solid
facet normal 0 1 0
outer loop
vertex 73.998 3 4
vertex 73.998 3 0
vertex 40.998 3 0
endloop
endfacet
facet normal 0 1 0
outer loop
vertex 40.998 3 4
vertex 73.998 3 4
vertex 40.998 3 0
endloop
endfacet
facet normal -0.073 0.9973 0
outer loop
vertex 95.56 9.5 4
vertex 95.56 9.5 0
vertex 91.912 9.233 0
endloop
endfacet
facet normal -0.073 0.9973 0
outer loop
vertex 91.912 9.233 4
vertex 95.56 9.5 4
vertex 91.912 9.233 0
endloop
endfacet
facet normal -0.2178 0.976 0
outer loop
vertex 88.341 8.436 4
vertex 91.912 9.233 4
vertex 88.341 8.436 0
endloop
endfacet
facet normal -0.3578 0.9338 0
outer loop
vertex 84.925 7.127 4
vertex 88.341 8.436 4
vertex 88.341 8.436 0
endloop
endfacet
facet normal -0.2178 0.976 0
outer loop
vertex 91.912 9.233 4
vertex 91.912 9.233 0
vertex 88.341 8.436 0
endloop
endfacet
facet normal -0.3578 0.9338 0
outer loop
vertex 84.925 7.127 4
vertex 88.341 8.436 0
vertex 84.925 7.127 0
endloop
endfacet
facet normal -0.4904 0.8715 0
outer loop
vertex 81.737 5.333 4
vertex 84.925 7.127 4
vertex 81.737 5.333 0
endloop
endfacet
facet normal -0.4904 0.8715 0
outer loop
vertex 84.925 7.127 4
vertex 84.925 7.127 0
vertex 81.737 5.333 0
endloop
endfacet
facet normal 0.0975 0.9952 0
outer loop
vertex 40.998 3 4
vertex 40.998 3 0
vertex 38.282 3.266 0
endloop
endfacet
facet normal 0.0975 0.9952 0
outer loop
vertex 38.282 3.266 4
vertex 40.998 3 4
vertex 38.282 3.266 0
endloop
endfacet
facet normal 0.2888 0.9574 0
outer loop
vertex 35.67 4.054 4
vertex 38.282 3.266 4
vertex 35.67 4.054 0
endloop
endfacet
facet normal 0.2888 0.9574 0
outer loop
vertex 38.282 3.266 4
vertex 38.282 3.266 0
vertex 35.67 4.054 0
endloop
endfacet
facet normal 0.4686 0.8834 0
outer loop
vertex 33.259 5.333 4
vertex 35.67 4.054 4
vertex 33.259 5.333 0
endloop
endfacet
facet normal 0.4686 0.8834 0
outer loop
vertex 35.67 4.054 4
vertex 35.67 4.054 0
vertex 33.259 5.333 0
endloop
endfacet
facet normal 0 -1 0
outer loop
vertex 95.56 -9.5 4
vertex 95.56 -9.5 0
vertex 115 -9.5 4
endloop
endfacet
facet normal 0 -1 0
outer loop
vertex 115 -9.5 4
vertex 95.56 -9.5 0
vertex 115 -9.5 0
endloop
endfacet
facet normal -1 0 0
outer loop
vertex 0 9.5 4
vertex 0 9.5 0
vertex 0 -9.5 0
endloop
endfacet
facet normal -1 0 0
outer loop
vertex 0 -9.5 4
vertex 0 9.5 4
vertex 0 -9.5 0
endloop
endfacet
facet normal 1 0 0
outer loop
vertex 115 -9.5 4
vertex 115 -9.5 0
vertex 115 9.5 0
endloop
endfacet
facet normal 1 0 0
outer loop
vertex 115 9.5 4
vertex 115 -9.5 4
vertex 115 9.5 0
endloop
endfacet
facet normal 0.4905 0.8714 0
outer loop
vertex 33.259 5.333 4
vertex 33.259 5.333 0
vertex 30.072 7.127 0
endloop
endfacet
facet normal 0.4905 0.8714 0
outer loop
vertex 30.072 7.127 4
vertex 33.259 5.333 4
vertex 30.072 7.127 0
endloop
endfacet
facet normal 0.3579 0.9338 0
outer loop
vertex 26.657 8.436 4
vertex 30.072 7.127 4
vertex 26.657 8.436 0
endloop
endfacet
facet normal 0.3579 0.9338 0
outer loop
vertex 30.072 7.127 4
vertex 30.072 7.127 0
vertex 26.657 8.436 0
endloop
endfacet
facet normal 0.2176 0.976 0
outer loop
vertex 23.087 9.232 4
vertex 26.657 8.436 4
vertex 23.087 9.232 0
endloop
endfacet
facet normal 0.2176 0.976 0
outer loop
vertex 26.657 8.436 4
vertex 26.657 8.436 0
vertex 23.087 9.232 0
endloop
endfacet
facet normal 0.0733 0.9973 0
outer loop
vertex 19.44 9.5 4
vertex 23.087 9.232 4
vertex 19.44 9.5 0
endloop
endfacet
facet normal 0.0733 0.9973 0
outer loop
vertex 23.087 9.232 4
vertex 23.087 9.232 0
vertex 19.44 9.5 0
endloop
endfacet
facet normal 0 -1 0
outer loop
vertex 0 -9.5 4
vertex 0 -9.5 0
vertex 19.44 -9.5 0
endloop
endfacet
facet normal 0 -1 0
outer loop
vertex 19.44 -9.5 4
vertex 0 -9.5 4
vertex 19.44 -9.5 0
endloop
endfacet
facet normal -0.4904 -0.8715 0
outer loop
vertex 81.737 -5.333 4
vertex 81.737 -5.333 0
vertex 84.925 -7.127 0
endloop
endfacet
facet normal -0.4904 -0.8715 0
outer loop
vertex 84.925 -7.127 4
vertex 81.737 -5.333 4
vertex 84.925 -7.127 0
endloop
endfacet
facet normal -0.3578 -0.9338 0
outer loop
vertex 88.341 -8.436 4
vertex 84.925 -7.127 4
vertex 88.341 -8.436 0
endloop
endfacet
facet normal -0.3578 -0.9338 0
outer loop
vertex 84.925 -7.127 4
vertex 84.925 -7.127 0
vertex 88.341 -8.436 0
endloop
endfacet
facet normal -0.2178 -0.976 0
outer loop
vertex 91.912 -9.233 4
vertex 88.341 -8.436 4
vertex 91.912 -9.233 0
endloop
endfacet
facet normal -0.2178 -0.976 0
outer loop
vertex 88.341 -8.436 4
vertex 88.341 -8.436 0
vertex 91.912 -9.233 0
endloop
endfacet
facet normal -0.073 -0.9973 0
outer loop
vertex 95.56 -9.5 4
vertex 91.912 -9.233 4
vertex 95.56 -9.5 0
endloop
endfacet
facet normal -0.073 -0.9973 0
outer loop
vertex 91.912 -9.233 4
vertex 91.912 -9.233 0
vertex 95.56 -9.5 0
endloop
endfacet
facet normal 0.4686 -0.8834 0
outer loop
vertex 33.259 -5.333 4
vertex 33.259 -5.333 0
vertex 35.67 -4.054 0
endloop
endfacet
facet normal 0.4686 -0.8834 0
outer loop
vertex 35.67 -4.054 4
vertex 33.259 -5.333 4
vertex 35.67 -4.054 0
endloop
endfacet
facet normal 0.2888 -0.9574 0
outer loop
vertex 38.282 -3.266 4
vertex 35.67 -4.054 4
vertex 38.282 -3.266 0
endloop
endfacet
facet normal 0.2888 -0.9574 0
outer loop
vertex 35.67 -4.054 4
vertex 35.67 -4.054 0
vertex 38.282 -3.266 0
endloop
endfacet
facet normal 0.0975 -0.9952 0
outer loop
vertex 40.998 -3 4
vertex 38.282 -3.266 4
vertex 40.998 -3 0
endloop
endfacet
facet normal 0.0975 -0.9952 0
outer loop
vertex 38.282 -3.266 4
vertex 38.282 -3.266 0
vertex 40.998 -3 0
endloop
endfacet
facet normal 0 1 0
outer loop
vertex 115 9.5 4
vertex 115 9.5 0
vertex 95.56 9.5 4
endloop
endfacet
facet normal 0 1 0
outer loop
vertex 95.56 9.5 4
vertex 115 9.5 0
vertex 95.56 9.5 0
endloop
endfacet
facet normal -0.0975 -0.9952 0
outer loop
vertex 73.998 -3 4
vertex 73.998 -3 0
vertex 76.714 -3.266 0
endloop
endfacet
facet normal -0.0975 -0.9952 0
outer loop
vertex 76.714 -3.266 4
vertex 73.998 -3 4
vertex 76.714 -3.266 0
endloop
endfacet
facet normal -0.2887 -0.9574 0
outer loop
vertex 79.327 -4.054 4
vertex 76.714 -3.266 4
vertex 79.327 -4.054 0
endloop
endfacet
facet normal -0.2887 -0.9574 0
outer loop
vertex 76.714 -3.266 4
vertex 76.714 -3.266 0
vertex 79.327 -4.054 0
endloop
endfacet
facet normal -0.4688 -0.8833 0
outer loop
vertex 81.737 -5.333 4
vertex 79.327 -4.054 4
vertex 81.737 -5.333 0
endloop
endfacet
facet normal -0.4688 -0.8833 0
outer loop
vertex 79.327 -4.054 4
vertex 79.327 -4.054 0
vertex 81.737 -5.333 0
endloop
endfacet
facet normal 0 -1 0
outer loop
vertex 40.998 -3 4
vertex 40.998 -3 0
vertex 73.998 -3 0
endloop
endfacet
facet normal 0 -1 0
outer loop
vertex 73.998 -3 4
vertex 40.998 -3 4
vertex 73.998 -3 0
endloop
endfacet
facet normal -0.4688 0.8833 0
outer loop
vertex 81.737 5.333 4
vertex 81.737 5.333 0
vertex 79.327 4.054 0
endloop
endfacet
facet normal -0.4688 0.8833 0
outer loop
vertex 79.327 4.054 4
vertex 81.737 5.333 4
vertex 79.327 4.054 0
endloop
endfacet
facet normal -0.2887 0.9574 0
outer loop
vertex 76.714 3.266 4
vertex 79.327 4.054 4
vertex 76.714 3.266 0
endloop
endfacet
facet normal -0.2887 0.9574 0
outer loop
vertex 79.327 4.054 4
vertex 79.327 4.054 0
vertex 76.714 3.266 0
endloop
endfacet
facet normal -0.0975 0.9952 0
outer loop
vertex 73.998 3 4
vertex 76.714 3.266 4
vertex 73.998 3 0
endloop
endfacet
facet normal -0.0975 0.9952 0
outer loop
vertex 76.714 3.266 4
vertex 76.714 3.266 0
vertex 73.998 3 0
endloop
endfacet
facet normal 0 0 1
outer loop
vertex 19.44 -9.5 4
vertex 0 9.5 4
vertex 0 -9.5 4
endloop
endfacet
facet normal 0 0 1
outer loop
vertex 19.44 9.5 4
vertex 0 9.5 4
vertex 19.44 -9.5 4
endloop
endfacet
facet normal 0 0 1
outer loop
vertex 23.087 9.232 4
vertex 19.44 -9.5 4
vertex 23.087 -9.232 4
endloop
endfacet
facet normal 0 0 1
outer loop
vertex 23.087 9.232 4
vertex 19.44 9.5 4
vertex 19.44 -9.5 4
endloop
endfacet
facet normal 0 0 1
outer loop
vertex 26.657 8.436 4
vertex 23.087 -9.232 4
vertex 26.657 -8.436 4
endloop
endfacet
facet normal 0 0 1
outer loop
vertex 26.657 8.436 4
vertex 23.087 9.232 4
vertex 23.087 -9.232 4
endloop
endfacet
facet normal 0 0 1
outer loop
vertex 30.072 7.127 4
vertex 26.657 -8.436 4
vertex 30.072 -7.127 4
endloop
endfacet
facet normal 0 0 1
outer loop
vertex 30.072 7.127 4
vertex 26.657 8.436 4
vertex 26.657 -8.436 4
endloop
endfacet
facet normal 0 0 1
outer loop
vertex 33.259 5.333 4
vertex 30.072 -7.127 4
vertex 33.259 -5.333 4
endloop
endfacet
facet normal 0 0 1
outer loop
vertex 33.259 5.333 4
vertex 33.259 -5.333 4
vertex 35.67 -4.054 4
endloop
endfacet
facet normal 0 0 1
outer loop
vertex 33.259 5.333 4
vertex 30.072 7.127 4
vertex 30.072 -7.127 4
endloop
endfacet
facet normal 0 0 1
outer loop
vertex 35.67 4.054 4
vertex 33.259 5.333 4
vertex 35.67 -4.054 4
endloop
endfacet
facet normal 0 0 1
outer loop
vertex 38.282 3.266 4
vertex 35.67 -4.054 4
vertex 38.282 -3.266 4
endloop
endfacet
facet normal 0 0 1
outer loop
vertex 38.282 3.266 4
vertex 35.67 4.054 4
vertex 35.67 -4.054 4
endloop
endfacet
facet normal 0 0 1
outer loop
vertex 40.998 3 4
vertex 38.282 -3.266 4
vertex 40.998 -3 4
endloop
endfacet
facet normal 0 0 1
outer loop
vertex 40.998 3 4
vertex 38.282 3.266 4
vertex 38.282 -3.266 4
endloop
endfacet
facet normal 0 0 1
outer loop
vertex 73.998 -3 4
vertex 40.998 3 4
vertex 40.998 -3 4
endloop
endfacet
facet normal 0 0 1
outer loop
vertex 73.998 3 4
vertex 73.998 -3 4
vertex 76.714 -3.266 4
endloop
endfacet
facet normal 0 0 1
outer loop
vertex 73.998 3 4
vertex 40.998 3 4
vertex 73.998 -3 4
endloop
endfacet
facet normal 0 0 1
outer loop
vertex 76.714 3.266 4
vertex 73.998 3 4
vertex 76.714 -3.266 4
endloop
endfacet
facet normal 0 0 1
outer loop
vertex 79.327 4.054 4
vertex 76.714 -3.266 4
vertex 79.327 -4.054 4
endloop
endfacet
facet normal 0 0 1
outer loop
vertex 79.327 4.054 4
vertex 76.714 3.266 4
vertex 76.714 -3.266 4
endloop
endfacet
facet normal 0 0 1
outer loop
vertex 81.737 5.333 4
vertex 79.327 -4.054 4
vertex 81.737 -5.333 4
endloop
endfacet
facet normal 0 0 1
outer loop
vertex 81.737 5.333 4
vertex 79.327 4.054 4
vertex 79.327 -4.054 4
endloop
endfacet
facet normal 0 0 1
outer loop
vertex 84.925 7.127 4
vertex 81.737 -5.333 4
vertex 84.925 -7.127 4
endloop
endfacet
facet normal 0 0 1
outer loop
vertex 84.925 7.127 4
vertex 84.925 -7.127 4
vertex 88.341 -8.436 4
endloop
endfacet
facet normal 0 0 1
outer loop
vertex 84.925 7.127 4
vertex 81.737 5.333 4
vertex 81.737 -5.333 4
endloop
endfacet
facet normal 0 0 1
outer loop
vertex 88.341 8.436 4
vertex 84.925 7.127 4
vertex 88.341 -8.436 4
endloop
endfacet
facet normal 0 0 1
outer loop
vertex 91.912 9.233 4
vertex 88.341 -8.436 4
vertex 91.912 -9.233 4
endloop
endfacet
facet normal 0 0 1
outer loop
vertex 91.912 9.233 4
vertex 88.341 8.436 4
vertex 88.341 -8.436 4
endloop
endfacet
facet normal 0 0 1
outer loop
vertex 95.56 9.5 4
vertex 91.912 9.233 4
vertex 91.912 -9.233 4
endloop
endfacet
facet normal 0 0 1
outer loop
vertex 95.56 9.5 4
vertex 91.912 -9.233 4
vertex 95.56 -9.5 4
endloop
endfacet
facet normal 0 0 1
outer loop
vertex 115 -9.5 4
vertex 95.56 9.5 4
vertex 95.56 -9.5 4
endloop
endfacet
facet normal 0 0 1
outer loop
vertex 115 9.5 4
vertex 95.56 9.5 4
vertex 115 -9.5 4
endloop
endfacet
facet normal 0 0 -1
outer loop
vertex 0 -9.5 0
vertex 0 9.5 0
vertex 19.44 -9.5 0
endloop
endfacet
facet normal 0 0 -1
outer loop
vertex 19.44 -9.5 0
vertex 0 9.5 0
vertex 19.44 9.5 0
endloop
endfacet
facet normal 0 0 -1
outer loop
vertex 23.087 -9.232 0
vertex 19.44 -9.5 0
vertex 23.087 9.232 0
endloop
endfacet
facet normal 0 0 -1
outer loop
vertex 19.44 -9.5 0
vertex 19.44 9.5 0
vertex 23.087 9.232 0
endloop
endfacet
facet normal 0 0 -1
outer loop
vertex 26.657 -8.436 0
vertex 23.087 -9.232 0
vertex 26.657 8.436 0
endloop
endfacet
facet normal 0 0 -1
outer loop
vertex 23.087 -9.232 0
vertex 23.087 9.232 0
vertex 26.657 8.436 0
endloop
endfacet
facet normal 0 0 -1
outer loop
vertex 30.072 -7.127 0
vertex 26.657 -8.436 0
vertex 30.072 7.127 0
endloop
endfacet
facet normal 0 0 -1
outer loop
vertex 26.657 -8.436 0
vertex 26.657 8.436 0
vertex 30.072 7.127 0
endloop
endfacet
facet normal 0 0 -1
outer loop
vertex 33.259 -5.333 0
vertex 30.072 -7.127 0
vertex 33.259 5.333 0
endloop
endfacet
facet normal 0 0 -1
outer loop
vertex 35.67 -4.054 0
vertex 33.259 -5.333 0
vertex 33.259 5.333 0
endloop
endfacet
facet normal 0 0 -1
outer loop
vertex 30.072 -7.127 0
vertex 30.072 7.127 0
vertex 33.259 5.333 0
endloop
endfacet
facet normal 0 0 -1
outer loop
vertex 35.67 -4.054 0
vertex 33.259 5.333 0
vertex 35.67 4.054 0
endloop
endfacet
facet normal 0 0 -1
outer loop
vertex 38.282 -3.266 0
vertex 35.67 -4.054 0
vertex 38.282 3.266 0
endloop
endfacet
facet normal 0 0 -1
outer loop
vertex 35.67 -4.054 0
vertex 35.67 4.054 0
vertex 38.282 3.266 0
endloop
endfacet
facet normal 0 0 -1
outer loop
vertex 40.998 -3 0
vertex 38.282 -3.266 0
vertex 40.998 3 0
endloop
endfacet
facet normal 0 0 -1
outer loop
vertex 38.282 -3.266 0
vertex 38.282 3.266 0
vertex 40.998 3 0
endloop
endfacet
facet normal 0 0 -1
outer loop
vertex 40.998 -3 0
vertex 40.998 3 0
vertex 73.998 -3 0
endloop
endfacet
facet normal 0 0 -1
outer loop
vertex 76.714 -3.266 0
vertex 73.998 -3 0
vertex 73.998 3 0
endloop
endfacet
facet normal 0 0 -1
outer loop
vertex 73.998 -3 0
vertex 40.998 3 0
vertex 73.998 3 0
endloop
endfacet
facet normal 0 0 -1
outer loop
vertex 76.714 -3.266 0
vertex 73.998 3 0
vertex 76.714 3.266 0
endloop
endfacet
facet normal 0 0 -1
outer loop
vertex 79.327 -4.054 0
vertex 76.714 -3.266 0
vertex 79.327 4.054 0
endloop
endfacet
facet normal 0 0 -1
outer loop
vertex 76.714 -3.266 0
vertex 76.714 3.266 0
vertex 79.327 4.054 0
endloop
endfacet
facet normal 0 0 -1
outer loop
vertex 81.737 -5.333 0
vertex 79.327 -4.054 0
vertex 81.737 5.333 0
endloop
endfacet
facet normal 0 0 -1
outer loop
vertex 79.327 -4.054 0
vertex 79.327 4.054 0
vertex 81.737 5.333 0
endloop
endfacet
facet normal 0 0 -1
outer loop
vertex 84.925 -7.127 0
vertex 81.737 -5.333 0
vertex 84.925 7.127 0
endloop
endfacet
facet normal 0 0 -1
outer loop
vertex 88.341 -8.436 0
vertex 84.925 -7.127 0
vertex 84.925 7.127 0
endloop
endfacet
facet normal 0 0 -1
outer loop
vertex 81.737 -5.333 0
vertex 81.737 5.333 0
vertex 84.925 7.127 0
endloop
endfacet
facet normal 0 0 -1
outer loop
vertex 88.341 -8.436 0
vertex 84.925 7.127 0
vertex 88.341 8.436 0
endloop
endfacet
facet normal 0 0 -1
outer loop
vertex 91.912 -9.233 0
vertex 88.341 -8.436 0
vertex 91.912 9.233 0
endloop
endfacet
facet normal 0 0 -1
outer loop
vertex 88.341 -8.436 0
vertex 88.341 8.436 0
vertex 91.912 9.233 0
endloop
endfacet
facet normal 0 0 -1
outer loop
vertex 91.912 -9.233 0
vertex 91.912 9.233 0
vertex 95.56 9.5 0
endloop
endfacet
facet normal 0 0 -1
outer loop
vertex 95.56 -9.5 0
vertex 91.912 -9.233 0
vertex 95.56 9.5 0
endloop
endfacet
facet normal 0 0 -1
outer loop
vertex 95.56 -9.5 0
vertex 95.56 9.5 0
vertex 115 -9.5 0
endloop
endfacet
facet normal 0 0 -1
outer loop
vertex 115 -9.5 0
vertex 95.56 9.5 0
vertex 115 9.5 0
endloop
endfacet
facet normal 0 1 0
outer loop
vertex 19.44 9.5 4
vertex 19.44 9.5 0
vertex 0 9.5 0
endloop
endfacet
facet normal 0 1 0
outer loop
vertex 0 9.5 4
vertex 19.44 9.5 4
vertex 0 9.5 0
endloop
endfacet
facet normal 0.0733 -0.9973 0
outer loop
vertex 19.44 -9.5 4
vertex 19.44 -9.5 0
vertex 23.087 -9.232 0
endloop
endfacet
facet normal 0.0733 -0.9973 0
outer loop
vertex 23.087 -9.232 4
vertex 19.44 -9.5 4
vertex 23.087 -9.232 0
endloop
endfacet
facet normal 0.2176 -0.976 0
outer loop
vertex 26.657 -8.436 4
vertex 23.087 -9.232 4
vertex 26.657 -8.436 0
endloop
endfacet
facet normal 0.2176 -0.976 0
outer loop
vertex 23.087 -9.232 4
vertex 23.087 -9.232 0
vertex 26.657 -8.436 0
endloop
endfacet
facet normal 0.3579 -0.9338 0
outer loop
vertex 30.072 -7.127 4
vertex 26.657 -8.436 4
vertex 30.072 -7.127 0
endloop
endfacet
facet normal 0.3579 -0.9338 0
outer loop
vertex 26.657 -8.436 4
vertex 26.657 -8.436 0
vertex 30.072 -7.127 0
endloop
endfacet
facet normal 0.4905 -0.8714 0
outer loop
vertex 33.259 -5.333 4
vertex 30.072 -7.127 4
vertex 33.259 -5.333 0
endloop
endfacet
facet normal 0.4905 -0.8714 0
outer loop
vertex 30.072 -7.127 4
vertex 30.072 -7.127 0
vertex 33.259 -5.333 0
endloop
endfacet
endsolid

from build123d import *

# Parameters (mm, degrees)
F1_DEPTH = 4


with BuildPart() as f1:
    # F0 (on Top) → F1 (new body)
    with BuildSketch(Plane.XY):
        with BuildLine():
            Line((0, 9.5), (0, 0))
            Line((0, 0), (0, -9.5))
            Line((0, -9.5), (19.44, -9.5))
            ThreePointArc((19.44, -9.5), (26.656878, -8.435678), (33.25927, -5.333333))
            ThreePointArc((33.25927, -5.333333), (36.956609, -3.59602), (40.998061, -3))
            Line((40.998061, -3), (73.998061, -3))
            ThreePointArc((73.998061, -3), (78.039513, -3.596021), (81.736852, -5.333333))
            ThreePointArc((81.736852, -5.333333), (88.3411, -8.436238), (95.56, -9.5))
            Line((95.56, -9.5), (115, -9.5))
            Line((115, -9.5), (115, 0))
            Line((115, 0), (115, 9.5))
            Line((115, 9.5), (95.56, 9.5))
            ThreePointArc((95.56, 9.5), (88.3411, 8.436238), (81.736852, 5.333333))
            ThreePointArc((81.736852, 5.333333), (78.039513, 3.596021), (73.998061, 3))
            Line((73.998061, 3), (40.998061, 3))
            ThreePointArc((40.998061, 3), (36.956609, 3.59602), (33.25927, 5.333333))
            ThreePointArc((33.25927, 5.333333), (26.656878, 8.435678), (19.44, 9.5))
            Line((19.44, 9.5), (0, 9.5))
        make_face()
    extrude(amount=F1_DEPTH)


solid = f1.part
